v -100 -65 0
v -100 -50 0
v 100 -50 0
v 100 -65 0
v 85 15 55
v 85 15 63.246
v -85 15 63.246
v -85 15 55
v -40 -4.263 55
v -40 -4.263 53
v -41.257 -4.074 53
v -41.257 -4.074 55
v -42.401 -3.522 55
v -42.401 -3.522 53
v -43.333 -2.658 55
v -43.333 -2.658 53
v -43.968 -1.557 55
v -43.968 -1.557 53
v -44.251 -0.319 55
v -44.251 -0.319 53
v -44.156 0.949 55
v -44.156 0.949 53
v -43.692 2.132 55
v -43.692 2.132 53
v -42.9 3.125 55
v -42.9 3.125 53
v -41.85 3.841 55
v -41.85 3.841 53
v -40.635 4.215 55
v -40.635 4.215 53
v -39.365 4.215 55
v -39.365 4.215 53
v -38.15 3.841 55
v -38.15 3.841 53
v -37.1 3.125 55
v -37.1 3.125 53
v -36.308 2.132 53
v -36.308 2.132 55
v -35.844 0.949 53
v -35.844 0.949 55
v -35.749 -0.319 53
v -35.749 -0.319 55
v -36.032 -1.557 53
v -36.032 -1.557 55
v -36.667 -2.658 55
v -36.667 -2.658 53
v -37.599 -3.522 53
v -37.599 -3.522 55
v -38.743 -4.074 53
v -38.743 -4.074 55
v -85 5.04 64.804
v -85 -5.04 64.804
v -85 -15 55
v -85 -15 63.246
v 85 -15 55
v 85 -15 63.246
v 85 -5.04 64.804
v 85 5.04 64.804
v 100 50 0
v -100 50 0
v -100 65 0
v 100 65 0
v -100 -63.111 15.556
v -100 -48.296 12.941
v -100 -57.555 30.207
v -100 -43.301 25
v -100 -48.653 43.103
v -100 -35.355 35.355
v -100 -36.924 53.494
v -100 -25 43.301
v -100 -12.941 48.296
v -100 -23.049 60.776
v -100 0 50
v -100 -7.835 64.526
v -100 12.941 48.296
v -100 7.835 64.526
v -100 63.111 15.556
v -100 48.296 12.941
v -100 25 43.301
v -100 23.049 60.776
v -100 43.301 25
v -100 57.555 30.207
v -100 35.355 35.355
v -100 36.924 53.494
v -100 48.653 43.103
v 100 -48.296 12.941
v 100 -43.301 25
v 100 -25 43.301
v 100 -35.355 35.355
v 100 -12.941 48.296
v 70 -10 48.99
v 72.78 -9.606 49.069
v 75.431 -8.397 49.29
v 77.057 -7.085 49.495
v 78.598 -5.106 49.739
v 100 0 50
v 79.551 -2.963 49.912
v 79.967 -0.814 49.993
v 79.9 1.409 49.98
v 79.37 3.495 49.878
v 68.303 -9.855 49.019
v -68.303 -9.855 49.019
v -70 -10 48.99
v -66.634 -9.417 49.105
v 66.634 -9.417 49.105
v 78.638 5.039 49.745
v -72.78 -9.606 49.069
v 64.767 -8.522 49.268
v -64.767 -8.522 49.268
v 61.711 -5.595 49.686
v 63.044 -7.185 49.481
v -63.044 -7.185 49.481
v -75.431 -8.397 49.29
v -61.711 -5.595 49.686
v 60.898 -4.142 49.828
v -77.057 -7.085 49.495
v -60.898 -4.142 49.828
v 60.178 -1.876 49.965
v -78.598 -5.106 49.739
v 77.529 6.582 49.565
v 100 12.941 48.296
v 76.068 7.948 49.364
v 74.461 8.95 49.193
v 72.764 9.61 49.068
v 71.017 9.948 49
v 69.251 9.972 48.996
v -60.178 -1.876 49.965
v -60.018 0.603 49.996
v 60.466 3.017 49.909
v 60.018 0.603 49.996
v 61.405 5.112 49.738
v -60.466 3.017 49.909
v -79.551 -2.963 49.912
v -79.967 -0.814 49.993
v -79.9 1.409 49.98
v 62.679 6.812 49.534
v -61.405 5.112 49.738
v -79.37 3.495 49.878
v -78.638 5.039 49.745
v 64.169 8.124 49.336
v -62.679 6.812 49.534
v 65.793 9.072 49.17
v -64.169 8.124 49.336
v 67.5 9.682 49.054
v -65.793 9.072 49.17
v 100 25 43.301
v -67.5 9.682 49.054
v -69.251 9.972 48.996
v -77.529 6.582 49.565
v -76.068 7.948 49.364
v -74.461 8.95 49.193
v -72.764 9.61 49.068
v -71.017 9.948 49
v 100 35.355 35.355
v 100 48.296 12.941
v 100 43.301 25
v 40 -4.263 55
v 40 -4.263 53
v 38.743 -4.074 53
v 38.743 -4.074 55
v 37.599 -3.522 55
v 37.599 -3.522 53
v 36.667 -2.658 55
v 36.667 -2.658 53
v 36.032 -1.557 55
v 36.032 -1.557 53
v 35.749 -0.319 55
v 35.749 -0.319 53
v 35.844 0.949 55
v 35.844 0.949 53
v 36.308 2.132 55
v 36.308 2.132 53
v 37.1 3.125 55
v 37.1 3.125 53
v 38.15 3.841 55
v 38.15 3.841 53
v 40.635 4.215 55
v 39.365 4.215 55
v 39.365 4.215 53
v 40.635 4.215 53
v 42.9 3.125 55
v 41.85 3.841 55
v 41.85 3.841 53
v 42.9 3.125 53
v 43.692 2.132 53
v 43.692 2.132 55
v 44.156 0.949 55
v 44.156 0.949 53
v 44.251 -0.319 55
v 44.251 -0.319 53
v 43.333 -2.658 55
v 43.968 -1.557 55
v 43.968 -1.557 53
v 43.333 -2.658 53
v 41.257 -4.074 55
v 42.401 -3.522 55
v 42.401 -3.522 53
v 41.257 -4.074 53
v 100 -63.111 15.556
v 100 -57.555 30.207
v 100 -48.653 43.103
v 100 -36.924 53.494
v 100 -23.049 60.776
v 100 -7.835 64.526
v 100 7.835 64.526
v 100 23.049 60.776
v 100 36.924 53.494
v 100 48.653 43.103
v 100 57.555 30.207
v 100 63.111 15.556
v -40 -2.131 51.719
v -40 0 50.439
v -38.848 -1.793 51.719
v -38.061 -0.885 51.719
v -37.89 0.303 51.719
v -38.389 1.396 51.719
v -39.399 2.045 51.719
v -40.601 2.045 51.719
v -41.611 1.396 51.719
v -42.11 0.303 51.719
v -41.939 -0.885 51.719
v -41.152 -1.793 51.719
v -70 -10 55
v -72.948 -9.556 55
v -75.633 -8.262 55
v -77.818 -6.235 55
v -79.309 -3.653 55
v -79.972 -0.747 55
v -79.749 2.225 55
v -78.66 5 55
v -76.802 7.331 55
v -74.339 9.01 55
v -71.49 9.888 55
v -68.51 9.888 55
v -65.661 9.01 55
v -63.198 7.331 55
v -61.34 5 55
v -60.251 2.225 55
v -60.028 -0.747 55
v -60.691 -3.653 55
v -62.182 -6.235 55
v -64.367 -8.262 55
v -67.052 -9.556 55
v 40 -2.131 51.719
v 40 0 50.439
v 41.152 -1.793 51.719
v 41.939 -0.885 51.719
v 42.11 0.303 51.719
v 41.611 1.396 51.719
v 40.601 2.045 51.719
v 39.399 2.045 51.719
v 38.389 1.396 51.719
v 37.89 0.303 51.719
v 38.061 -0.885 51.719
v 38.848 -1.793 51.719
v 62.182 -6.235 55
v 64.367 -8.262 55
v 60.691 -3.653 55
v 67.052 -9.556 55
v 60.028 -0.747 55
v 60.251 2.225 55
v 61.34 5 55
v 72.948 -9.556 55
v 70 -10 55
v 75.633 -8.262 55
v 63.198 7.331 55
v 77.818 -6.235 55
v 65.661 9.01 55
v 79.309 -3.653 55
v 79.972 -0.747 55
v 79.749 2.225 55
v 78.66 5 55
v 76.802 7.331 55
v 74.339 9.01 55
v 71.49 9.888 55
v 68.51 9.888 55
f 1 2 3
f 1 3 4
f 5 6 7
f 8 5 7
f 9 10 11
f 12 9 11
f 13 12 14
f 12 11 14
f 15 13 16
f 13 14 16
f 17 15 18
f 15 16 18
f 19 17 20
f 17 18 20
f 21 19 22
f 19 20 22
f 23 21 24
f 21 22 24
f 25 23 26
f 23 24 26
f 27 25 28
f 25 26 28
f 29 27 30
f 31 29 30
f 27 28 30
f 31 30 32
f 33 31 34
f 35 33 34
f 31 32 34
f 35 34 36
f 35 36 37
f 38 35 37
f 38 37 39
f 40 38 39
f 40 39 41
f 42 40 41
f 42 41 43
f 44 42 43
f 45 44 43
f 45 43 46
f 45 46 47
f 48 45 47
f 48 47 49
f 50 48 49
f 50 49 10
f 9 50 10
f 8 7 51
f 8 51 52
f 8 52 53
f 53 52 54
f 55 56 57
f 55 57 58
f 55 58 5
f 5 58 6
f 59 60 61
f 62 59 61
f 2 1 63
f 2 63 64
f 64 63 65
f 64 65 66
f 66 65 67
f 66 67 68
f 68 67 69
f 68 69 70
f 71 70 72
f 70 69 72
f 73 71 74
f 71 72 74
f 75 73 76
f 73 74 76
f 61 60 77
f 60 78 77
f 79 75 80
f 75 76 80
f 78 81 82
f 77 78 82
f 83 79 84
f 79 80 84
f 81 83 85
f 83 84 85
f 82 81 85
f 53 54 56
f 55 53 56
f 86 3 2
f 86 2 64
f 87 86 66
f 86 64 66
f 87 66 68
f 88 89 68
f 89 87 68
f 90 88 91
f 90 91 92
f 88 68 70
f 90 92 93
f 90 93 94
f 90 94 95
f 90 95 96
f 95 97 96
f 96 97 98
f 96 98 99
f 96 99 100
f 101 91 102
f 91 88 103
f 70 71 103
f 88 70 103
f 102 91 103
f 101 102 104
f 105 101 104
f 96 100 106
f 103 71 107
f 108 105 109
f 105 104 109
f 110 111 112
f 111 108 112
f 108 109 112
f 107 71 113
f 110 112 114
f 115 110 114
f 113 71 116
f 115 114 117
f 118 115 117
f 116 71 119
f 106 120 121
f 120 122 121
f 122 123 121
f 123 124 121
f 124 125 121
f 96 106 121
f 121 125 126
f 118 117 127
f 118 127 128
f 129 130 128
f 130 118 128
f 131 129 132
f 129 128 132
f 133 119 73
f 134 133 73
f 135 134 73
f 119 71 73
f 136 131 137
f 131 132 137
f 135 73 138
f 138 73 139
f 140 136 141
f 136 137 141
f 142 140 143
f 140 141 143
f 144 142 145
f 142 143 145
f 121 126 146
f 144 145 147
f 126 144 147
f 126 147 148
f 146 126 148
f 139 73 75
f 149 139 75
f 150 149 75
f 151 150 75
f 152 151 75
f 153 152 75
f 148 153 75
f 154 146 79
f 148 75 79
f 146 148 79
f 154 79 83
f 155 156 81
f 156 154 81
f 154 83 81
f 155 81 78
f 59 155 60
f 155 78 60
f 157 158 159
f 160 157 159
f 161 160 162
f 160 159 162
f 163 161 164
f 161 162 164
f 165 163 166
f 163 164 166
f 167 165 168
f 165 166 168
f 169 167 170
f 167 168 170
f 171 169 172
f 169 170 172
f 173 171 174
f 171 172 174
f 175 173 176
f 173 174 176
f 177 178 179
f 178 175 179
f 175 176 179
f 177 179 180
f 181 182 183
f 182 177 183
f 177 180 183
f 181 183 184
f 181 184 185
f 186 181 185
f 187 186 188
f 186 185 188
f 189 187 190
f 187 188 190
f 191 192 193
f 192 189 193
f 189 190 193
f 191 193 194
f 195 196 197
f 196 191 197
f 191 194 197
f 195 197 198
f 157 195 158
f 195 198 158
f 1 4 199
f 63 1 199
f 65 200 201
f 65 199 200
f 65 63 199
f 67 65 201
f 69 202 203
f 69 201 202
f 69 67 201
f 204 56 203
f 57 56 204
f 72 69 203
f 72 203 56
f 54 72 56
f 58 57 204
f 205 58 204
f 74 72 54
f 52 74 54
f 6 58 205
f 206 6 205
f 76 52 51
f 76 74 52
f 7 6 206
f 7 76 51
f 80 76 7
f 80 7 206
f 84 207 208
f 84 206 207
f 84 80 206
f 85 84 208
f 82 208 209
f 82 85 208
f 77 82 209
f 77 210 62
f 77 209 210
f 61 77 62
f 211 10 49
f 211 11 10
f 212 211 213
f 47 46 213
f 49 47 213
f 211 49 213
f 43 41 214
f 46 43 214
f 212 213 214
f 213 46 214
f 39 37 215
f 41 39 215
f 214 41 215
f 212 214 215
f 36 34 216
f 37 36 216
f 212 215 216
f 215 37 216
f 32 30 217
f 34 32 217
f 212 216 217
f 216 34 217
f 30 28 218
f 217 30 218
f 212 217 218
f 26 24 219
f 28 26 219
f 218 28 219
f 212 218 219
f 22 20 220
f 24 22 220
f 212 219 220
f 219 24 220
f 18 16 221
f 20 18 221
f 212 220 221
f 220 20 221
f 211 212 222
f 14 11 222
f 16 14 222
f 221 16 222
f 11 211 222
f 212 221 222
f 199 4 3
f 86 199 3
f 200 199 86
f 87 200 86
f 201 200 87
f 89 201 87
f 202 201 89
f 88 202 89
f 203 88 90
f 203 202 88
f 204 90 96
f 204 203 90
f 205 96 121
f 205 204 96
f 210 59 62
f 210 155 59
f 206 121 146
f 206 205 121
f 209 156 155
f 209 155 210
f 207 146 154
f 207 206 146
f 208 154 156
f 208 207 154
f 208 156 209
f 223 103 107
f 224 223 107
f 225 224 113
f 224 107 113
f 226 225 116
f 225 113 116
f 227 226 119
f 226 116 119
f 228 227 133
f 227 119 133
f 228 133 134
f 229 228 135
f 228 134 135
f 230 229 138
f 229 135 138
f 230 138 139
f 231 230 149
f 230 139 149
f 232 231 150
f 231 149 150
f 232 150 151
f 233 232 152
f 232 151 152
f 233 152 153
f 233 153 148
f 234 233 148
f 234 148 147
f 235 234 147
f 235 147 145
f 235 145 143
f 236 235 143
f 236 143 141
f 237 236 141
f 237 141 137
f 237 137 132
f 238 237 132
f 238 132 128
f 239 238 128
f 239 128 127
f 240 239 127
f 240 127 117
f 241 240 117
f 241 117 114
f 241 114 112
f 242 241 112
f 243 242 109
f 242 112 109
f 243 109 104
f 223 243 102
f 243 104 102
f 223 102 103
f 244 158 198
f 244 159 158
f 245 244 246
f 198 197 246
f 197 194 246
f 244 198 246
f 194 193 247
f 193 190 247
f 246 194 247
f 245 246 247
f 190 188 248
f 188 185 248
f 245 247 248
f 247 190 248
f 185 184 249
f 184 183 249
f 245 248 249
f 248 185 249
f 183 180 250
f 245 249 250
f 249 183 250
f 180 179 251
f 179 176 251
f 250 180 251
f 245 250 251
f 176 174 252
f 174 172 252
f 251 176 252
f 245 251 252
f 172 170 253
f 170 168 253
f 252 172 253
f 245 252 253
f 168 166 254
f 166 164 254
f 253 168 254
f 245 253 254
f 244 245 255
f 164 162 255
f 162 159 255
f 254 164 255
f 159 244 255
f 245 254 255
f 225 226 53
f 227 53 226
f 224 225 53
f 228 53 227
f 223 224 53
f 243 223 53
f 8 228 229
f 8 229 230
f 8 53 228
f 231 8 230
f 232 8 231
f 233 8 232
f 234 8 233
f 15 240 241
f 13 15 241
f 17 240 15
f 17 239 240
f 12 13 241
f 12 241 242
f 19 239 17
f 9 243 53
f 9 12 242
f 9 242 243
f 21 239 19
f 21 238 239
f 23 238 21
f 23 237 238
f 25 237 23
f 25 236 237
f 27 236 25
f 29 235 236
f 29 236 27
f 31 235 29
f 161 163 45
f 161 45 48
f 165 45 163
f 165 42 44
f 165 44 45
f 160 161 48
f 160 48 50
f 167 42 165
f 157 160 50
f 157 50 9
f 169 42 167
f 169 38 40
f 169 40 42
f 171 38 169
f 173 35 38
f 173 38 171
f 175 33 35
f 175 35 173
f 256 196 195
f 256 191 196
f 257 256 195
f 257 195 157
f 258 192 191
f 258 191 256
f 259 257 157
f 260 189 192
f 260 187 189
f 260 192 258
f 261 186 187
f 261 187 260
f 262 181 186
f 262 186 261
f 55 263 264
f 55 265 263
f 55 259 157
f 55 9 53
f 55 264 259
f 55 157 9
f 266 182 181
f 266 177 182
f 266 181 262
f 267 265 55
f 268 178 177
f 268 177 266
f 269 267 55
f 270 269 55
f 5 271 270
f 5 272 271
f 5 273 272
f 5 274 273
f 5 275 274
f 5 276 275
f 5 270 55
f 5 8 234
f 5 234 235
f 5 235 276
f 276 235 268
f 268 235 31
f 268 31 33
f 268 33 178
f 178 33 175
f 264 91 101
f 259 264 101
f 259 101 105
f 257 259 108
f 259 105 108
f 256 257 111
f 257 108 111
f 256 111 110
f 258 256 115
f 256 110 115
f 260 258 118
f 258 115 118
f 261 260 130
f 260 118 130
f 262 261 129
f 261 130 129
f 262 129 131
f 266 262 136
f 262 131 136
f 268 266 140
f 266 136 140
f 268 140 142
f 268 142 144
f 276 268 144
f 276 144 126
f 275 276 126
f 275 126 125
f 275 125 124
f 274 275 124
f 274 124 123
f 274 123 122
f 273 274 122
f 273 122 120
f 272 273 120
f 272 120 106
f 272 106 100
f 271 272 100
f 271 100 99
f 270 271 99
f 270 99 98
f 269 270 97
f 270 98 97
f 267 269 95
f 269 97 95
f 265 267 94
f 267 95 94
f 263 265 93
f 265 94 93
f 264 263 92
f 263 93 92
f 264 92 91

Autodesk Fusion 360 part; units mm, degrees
sketch "Boceto1" plane through (0, 0, 0) normal (1, 0, 0) x (0, 1, 0)
  arc A0 (50, 0) -> (-50, 0) centre (0, 0) ccw
  line L0 (50, 0) -> (65, 0)
  line L1 (-50, 0) -> (-65, 0)
  arc A1 (65, 0) -> (-65, 0) centre (0, 0) ccw
  dimension "d3" = 100
  dimension "d27" = 15
  dimension "d28" = 15
extrude "Extruir1" add sketch "Boceto1" along normal mid plane 200
sketch "Boceto4" plane through (106.6931, 0, 65) normal (0, 0, 1) x (1, 0, 0)
ref_plane "PlanoDeObra4" through (0, 0, 65) normal (0, 0, 1) x (0, -1, 0)
sketch "Boceto5" plane through (0, 0, 65) normal (0, 0, 1) x (1, 0, 0)
  line L0 (85, 15) -> (-85, 15)
  line L1 (-85, 15) -> (-85, -15)
  line L2 (-85, -15) -> (85, -15)
  line L3 (85, -15) -> (85, 15)
  line L4 (85, 15) -> (-85, -15) construction
  line L5 (-85, 15) -> (85, -15) construction
  dimension "d31" = 170
  dimension "d32" = 30
extrude "Extruir3" cut sketch "Boceto5" against normal blind 10
sketch "Boceto6" plane through (0, 0, 55) normal (0, 0, 1) x (-1, 0, 0)
  line L0 (-85, 15) -> (-85, -15)
  line L1 (-85, -15) -> (85, -15)
  line L2 (85, -15) -> (85, 15)
  line L3 (85, 15) -> (-85, 15)
  circle A0 centre (70, 0) radius 10
  circle A1 centre (40, 0) radius 5
  dimension "d35" = 20
  dimension "d36" = 10
  dimension "d37" = 15
  dimension "d38" = 15
  dimension "d39" = 30
hole "Agujero3" at (-40, 0, 55) direction (0, 0, -1) diameter 8.526 depth 2 tip angle 118
hole "Agujero4" at (-70, 0, 55) direction (0, 0, -1) diameter 20 end through all
ref_plane "PlanoDeObra5" through (0, 0, 60.9016) normal (1, 0, 0) x (0, -1, 0)
mirror "Simetría3" about plane through (0, 0, 60.9016) normal (1, 0, 0) of "Agujero3", "Agujero4"
